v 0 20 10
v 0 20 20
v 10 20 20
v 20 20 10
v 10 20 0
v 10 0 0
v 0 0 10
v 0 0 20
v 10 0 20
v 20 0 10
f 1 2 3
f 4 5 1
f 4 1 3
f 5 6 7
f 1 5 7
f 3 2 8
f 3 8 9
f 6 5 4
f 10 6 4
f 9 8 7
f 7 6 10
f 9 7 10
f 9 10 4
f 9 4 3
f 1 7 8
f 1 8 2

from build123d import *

# Parameters (mm, degrees)
SKETCH1_W           = 20
SKETCH1_H           = 20
BOSS_EXTRUDE1_DEPTH = 20
CUT_EXTRUDE1_DEPTH  = 20
CUT_EXTRUDE2_DEPTH  = 20
CUT_EXTRUDE3_DEPTH  = 20


with BuildPart() as part:
    # Sketch1 → Boss-Extrude1 (new body)
    with BuildSketch(Plane.XY):
        with Locations((10, 10)):
            Rectangle(SKETCH1_W, SKETCH1_H)
    extrude(amount=BOSS_EXTRUDE1_DEPTH)

    # Sketch2 → Cut-Extrude1 (cut)
    with BuildSketch(Plane(origin=(0, 20, 0), x_dir=(1, 0, 0), z_dir=(0, 1, 0))):
        Polygon((20, 0), (10, 0), (20, -10), align=None)
    extrude(amount=-CUT_EXTRUDE1_DEPTH, mode=Mode.SUBTRACT)

    # Sketch3 → Cut-Extrude2 (cut)
    with BuildSketch(Plane(origin=(0, 20, 0), x_dir=(1, 0, 0), z_dir=(0, 1, 0))):
        Polygon((20, -20), (20, -10), (10, -20), align=None)
    extrude(amount=-CUT_EXTRUDE2_DEPTH, mode=Mode.SUBTRACT)

    # Sketch4 → Cut-Extrude3 (cut)
    with BuildSketch(Plane(origin=(0, 20, 0), x_dir=(1, 0, 0), z_dir=(0, 1, 0))):
        Polygon((0, 0), (10, 0), (0, -10), align=None)
    extrude(amount=-CUT_EXTRUDE3_DEPTH, mode=Mode.SUBTRACT)


solid = part.part
